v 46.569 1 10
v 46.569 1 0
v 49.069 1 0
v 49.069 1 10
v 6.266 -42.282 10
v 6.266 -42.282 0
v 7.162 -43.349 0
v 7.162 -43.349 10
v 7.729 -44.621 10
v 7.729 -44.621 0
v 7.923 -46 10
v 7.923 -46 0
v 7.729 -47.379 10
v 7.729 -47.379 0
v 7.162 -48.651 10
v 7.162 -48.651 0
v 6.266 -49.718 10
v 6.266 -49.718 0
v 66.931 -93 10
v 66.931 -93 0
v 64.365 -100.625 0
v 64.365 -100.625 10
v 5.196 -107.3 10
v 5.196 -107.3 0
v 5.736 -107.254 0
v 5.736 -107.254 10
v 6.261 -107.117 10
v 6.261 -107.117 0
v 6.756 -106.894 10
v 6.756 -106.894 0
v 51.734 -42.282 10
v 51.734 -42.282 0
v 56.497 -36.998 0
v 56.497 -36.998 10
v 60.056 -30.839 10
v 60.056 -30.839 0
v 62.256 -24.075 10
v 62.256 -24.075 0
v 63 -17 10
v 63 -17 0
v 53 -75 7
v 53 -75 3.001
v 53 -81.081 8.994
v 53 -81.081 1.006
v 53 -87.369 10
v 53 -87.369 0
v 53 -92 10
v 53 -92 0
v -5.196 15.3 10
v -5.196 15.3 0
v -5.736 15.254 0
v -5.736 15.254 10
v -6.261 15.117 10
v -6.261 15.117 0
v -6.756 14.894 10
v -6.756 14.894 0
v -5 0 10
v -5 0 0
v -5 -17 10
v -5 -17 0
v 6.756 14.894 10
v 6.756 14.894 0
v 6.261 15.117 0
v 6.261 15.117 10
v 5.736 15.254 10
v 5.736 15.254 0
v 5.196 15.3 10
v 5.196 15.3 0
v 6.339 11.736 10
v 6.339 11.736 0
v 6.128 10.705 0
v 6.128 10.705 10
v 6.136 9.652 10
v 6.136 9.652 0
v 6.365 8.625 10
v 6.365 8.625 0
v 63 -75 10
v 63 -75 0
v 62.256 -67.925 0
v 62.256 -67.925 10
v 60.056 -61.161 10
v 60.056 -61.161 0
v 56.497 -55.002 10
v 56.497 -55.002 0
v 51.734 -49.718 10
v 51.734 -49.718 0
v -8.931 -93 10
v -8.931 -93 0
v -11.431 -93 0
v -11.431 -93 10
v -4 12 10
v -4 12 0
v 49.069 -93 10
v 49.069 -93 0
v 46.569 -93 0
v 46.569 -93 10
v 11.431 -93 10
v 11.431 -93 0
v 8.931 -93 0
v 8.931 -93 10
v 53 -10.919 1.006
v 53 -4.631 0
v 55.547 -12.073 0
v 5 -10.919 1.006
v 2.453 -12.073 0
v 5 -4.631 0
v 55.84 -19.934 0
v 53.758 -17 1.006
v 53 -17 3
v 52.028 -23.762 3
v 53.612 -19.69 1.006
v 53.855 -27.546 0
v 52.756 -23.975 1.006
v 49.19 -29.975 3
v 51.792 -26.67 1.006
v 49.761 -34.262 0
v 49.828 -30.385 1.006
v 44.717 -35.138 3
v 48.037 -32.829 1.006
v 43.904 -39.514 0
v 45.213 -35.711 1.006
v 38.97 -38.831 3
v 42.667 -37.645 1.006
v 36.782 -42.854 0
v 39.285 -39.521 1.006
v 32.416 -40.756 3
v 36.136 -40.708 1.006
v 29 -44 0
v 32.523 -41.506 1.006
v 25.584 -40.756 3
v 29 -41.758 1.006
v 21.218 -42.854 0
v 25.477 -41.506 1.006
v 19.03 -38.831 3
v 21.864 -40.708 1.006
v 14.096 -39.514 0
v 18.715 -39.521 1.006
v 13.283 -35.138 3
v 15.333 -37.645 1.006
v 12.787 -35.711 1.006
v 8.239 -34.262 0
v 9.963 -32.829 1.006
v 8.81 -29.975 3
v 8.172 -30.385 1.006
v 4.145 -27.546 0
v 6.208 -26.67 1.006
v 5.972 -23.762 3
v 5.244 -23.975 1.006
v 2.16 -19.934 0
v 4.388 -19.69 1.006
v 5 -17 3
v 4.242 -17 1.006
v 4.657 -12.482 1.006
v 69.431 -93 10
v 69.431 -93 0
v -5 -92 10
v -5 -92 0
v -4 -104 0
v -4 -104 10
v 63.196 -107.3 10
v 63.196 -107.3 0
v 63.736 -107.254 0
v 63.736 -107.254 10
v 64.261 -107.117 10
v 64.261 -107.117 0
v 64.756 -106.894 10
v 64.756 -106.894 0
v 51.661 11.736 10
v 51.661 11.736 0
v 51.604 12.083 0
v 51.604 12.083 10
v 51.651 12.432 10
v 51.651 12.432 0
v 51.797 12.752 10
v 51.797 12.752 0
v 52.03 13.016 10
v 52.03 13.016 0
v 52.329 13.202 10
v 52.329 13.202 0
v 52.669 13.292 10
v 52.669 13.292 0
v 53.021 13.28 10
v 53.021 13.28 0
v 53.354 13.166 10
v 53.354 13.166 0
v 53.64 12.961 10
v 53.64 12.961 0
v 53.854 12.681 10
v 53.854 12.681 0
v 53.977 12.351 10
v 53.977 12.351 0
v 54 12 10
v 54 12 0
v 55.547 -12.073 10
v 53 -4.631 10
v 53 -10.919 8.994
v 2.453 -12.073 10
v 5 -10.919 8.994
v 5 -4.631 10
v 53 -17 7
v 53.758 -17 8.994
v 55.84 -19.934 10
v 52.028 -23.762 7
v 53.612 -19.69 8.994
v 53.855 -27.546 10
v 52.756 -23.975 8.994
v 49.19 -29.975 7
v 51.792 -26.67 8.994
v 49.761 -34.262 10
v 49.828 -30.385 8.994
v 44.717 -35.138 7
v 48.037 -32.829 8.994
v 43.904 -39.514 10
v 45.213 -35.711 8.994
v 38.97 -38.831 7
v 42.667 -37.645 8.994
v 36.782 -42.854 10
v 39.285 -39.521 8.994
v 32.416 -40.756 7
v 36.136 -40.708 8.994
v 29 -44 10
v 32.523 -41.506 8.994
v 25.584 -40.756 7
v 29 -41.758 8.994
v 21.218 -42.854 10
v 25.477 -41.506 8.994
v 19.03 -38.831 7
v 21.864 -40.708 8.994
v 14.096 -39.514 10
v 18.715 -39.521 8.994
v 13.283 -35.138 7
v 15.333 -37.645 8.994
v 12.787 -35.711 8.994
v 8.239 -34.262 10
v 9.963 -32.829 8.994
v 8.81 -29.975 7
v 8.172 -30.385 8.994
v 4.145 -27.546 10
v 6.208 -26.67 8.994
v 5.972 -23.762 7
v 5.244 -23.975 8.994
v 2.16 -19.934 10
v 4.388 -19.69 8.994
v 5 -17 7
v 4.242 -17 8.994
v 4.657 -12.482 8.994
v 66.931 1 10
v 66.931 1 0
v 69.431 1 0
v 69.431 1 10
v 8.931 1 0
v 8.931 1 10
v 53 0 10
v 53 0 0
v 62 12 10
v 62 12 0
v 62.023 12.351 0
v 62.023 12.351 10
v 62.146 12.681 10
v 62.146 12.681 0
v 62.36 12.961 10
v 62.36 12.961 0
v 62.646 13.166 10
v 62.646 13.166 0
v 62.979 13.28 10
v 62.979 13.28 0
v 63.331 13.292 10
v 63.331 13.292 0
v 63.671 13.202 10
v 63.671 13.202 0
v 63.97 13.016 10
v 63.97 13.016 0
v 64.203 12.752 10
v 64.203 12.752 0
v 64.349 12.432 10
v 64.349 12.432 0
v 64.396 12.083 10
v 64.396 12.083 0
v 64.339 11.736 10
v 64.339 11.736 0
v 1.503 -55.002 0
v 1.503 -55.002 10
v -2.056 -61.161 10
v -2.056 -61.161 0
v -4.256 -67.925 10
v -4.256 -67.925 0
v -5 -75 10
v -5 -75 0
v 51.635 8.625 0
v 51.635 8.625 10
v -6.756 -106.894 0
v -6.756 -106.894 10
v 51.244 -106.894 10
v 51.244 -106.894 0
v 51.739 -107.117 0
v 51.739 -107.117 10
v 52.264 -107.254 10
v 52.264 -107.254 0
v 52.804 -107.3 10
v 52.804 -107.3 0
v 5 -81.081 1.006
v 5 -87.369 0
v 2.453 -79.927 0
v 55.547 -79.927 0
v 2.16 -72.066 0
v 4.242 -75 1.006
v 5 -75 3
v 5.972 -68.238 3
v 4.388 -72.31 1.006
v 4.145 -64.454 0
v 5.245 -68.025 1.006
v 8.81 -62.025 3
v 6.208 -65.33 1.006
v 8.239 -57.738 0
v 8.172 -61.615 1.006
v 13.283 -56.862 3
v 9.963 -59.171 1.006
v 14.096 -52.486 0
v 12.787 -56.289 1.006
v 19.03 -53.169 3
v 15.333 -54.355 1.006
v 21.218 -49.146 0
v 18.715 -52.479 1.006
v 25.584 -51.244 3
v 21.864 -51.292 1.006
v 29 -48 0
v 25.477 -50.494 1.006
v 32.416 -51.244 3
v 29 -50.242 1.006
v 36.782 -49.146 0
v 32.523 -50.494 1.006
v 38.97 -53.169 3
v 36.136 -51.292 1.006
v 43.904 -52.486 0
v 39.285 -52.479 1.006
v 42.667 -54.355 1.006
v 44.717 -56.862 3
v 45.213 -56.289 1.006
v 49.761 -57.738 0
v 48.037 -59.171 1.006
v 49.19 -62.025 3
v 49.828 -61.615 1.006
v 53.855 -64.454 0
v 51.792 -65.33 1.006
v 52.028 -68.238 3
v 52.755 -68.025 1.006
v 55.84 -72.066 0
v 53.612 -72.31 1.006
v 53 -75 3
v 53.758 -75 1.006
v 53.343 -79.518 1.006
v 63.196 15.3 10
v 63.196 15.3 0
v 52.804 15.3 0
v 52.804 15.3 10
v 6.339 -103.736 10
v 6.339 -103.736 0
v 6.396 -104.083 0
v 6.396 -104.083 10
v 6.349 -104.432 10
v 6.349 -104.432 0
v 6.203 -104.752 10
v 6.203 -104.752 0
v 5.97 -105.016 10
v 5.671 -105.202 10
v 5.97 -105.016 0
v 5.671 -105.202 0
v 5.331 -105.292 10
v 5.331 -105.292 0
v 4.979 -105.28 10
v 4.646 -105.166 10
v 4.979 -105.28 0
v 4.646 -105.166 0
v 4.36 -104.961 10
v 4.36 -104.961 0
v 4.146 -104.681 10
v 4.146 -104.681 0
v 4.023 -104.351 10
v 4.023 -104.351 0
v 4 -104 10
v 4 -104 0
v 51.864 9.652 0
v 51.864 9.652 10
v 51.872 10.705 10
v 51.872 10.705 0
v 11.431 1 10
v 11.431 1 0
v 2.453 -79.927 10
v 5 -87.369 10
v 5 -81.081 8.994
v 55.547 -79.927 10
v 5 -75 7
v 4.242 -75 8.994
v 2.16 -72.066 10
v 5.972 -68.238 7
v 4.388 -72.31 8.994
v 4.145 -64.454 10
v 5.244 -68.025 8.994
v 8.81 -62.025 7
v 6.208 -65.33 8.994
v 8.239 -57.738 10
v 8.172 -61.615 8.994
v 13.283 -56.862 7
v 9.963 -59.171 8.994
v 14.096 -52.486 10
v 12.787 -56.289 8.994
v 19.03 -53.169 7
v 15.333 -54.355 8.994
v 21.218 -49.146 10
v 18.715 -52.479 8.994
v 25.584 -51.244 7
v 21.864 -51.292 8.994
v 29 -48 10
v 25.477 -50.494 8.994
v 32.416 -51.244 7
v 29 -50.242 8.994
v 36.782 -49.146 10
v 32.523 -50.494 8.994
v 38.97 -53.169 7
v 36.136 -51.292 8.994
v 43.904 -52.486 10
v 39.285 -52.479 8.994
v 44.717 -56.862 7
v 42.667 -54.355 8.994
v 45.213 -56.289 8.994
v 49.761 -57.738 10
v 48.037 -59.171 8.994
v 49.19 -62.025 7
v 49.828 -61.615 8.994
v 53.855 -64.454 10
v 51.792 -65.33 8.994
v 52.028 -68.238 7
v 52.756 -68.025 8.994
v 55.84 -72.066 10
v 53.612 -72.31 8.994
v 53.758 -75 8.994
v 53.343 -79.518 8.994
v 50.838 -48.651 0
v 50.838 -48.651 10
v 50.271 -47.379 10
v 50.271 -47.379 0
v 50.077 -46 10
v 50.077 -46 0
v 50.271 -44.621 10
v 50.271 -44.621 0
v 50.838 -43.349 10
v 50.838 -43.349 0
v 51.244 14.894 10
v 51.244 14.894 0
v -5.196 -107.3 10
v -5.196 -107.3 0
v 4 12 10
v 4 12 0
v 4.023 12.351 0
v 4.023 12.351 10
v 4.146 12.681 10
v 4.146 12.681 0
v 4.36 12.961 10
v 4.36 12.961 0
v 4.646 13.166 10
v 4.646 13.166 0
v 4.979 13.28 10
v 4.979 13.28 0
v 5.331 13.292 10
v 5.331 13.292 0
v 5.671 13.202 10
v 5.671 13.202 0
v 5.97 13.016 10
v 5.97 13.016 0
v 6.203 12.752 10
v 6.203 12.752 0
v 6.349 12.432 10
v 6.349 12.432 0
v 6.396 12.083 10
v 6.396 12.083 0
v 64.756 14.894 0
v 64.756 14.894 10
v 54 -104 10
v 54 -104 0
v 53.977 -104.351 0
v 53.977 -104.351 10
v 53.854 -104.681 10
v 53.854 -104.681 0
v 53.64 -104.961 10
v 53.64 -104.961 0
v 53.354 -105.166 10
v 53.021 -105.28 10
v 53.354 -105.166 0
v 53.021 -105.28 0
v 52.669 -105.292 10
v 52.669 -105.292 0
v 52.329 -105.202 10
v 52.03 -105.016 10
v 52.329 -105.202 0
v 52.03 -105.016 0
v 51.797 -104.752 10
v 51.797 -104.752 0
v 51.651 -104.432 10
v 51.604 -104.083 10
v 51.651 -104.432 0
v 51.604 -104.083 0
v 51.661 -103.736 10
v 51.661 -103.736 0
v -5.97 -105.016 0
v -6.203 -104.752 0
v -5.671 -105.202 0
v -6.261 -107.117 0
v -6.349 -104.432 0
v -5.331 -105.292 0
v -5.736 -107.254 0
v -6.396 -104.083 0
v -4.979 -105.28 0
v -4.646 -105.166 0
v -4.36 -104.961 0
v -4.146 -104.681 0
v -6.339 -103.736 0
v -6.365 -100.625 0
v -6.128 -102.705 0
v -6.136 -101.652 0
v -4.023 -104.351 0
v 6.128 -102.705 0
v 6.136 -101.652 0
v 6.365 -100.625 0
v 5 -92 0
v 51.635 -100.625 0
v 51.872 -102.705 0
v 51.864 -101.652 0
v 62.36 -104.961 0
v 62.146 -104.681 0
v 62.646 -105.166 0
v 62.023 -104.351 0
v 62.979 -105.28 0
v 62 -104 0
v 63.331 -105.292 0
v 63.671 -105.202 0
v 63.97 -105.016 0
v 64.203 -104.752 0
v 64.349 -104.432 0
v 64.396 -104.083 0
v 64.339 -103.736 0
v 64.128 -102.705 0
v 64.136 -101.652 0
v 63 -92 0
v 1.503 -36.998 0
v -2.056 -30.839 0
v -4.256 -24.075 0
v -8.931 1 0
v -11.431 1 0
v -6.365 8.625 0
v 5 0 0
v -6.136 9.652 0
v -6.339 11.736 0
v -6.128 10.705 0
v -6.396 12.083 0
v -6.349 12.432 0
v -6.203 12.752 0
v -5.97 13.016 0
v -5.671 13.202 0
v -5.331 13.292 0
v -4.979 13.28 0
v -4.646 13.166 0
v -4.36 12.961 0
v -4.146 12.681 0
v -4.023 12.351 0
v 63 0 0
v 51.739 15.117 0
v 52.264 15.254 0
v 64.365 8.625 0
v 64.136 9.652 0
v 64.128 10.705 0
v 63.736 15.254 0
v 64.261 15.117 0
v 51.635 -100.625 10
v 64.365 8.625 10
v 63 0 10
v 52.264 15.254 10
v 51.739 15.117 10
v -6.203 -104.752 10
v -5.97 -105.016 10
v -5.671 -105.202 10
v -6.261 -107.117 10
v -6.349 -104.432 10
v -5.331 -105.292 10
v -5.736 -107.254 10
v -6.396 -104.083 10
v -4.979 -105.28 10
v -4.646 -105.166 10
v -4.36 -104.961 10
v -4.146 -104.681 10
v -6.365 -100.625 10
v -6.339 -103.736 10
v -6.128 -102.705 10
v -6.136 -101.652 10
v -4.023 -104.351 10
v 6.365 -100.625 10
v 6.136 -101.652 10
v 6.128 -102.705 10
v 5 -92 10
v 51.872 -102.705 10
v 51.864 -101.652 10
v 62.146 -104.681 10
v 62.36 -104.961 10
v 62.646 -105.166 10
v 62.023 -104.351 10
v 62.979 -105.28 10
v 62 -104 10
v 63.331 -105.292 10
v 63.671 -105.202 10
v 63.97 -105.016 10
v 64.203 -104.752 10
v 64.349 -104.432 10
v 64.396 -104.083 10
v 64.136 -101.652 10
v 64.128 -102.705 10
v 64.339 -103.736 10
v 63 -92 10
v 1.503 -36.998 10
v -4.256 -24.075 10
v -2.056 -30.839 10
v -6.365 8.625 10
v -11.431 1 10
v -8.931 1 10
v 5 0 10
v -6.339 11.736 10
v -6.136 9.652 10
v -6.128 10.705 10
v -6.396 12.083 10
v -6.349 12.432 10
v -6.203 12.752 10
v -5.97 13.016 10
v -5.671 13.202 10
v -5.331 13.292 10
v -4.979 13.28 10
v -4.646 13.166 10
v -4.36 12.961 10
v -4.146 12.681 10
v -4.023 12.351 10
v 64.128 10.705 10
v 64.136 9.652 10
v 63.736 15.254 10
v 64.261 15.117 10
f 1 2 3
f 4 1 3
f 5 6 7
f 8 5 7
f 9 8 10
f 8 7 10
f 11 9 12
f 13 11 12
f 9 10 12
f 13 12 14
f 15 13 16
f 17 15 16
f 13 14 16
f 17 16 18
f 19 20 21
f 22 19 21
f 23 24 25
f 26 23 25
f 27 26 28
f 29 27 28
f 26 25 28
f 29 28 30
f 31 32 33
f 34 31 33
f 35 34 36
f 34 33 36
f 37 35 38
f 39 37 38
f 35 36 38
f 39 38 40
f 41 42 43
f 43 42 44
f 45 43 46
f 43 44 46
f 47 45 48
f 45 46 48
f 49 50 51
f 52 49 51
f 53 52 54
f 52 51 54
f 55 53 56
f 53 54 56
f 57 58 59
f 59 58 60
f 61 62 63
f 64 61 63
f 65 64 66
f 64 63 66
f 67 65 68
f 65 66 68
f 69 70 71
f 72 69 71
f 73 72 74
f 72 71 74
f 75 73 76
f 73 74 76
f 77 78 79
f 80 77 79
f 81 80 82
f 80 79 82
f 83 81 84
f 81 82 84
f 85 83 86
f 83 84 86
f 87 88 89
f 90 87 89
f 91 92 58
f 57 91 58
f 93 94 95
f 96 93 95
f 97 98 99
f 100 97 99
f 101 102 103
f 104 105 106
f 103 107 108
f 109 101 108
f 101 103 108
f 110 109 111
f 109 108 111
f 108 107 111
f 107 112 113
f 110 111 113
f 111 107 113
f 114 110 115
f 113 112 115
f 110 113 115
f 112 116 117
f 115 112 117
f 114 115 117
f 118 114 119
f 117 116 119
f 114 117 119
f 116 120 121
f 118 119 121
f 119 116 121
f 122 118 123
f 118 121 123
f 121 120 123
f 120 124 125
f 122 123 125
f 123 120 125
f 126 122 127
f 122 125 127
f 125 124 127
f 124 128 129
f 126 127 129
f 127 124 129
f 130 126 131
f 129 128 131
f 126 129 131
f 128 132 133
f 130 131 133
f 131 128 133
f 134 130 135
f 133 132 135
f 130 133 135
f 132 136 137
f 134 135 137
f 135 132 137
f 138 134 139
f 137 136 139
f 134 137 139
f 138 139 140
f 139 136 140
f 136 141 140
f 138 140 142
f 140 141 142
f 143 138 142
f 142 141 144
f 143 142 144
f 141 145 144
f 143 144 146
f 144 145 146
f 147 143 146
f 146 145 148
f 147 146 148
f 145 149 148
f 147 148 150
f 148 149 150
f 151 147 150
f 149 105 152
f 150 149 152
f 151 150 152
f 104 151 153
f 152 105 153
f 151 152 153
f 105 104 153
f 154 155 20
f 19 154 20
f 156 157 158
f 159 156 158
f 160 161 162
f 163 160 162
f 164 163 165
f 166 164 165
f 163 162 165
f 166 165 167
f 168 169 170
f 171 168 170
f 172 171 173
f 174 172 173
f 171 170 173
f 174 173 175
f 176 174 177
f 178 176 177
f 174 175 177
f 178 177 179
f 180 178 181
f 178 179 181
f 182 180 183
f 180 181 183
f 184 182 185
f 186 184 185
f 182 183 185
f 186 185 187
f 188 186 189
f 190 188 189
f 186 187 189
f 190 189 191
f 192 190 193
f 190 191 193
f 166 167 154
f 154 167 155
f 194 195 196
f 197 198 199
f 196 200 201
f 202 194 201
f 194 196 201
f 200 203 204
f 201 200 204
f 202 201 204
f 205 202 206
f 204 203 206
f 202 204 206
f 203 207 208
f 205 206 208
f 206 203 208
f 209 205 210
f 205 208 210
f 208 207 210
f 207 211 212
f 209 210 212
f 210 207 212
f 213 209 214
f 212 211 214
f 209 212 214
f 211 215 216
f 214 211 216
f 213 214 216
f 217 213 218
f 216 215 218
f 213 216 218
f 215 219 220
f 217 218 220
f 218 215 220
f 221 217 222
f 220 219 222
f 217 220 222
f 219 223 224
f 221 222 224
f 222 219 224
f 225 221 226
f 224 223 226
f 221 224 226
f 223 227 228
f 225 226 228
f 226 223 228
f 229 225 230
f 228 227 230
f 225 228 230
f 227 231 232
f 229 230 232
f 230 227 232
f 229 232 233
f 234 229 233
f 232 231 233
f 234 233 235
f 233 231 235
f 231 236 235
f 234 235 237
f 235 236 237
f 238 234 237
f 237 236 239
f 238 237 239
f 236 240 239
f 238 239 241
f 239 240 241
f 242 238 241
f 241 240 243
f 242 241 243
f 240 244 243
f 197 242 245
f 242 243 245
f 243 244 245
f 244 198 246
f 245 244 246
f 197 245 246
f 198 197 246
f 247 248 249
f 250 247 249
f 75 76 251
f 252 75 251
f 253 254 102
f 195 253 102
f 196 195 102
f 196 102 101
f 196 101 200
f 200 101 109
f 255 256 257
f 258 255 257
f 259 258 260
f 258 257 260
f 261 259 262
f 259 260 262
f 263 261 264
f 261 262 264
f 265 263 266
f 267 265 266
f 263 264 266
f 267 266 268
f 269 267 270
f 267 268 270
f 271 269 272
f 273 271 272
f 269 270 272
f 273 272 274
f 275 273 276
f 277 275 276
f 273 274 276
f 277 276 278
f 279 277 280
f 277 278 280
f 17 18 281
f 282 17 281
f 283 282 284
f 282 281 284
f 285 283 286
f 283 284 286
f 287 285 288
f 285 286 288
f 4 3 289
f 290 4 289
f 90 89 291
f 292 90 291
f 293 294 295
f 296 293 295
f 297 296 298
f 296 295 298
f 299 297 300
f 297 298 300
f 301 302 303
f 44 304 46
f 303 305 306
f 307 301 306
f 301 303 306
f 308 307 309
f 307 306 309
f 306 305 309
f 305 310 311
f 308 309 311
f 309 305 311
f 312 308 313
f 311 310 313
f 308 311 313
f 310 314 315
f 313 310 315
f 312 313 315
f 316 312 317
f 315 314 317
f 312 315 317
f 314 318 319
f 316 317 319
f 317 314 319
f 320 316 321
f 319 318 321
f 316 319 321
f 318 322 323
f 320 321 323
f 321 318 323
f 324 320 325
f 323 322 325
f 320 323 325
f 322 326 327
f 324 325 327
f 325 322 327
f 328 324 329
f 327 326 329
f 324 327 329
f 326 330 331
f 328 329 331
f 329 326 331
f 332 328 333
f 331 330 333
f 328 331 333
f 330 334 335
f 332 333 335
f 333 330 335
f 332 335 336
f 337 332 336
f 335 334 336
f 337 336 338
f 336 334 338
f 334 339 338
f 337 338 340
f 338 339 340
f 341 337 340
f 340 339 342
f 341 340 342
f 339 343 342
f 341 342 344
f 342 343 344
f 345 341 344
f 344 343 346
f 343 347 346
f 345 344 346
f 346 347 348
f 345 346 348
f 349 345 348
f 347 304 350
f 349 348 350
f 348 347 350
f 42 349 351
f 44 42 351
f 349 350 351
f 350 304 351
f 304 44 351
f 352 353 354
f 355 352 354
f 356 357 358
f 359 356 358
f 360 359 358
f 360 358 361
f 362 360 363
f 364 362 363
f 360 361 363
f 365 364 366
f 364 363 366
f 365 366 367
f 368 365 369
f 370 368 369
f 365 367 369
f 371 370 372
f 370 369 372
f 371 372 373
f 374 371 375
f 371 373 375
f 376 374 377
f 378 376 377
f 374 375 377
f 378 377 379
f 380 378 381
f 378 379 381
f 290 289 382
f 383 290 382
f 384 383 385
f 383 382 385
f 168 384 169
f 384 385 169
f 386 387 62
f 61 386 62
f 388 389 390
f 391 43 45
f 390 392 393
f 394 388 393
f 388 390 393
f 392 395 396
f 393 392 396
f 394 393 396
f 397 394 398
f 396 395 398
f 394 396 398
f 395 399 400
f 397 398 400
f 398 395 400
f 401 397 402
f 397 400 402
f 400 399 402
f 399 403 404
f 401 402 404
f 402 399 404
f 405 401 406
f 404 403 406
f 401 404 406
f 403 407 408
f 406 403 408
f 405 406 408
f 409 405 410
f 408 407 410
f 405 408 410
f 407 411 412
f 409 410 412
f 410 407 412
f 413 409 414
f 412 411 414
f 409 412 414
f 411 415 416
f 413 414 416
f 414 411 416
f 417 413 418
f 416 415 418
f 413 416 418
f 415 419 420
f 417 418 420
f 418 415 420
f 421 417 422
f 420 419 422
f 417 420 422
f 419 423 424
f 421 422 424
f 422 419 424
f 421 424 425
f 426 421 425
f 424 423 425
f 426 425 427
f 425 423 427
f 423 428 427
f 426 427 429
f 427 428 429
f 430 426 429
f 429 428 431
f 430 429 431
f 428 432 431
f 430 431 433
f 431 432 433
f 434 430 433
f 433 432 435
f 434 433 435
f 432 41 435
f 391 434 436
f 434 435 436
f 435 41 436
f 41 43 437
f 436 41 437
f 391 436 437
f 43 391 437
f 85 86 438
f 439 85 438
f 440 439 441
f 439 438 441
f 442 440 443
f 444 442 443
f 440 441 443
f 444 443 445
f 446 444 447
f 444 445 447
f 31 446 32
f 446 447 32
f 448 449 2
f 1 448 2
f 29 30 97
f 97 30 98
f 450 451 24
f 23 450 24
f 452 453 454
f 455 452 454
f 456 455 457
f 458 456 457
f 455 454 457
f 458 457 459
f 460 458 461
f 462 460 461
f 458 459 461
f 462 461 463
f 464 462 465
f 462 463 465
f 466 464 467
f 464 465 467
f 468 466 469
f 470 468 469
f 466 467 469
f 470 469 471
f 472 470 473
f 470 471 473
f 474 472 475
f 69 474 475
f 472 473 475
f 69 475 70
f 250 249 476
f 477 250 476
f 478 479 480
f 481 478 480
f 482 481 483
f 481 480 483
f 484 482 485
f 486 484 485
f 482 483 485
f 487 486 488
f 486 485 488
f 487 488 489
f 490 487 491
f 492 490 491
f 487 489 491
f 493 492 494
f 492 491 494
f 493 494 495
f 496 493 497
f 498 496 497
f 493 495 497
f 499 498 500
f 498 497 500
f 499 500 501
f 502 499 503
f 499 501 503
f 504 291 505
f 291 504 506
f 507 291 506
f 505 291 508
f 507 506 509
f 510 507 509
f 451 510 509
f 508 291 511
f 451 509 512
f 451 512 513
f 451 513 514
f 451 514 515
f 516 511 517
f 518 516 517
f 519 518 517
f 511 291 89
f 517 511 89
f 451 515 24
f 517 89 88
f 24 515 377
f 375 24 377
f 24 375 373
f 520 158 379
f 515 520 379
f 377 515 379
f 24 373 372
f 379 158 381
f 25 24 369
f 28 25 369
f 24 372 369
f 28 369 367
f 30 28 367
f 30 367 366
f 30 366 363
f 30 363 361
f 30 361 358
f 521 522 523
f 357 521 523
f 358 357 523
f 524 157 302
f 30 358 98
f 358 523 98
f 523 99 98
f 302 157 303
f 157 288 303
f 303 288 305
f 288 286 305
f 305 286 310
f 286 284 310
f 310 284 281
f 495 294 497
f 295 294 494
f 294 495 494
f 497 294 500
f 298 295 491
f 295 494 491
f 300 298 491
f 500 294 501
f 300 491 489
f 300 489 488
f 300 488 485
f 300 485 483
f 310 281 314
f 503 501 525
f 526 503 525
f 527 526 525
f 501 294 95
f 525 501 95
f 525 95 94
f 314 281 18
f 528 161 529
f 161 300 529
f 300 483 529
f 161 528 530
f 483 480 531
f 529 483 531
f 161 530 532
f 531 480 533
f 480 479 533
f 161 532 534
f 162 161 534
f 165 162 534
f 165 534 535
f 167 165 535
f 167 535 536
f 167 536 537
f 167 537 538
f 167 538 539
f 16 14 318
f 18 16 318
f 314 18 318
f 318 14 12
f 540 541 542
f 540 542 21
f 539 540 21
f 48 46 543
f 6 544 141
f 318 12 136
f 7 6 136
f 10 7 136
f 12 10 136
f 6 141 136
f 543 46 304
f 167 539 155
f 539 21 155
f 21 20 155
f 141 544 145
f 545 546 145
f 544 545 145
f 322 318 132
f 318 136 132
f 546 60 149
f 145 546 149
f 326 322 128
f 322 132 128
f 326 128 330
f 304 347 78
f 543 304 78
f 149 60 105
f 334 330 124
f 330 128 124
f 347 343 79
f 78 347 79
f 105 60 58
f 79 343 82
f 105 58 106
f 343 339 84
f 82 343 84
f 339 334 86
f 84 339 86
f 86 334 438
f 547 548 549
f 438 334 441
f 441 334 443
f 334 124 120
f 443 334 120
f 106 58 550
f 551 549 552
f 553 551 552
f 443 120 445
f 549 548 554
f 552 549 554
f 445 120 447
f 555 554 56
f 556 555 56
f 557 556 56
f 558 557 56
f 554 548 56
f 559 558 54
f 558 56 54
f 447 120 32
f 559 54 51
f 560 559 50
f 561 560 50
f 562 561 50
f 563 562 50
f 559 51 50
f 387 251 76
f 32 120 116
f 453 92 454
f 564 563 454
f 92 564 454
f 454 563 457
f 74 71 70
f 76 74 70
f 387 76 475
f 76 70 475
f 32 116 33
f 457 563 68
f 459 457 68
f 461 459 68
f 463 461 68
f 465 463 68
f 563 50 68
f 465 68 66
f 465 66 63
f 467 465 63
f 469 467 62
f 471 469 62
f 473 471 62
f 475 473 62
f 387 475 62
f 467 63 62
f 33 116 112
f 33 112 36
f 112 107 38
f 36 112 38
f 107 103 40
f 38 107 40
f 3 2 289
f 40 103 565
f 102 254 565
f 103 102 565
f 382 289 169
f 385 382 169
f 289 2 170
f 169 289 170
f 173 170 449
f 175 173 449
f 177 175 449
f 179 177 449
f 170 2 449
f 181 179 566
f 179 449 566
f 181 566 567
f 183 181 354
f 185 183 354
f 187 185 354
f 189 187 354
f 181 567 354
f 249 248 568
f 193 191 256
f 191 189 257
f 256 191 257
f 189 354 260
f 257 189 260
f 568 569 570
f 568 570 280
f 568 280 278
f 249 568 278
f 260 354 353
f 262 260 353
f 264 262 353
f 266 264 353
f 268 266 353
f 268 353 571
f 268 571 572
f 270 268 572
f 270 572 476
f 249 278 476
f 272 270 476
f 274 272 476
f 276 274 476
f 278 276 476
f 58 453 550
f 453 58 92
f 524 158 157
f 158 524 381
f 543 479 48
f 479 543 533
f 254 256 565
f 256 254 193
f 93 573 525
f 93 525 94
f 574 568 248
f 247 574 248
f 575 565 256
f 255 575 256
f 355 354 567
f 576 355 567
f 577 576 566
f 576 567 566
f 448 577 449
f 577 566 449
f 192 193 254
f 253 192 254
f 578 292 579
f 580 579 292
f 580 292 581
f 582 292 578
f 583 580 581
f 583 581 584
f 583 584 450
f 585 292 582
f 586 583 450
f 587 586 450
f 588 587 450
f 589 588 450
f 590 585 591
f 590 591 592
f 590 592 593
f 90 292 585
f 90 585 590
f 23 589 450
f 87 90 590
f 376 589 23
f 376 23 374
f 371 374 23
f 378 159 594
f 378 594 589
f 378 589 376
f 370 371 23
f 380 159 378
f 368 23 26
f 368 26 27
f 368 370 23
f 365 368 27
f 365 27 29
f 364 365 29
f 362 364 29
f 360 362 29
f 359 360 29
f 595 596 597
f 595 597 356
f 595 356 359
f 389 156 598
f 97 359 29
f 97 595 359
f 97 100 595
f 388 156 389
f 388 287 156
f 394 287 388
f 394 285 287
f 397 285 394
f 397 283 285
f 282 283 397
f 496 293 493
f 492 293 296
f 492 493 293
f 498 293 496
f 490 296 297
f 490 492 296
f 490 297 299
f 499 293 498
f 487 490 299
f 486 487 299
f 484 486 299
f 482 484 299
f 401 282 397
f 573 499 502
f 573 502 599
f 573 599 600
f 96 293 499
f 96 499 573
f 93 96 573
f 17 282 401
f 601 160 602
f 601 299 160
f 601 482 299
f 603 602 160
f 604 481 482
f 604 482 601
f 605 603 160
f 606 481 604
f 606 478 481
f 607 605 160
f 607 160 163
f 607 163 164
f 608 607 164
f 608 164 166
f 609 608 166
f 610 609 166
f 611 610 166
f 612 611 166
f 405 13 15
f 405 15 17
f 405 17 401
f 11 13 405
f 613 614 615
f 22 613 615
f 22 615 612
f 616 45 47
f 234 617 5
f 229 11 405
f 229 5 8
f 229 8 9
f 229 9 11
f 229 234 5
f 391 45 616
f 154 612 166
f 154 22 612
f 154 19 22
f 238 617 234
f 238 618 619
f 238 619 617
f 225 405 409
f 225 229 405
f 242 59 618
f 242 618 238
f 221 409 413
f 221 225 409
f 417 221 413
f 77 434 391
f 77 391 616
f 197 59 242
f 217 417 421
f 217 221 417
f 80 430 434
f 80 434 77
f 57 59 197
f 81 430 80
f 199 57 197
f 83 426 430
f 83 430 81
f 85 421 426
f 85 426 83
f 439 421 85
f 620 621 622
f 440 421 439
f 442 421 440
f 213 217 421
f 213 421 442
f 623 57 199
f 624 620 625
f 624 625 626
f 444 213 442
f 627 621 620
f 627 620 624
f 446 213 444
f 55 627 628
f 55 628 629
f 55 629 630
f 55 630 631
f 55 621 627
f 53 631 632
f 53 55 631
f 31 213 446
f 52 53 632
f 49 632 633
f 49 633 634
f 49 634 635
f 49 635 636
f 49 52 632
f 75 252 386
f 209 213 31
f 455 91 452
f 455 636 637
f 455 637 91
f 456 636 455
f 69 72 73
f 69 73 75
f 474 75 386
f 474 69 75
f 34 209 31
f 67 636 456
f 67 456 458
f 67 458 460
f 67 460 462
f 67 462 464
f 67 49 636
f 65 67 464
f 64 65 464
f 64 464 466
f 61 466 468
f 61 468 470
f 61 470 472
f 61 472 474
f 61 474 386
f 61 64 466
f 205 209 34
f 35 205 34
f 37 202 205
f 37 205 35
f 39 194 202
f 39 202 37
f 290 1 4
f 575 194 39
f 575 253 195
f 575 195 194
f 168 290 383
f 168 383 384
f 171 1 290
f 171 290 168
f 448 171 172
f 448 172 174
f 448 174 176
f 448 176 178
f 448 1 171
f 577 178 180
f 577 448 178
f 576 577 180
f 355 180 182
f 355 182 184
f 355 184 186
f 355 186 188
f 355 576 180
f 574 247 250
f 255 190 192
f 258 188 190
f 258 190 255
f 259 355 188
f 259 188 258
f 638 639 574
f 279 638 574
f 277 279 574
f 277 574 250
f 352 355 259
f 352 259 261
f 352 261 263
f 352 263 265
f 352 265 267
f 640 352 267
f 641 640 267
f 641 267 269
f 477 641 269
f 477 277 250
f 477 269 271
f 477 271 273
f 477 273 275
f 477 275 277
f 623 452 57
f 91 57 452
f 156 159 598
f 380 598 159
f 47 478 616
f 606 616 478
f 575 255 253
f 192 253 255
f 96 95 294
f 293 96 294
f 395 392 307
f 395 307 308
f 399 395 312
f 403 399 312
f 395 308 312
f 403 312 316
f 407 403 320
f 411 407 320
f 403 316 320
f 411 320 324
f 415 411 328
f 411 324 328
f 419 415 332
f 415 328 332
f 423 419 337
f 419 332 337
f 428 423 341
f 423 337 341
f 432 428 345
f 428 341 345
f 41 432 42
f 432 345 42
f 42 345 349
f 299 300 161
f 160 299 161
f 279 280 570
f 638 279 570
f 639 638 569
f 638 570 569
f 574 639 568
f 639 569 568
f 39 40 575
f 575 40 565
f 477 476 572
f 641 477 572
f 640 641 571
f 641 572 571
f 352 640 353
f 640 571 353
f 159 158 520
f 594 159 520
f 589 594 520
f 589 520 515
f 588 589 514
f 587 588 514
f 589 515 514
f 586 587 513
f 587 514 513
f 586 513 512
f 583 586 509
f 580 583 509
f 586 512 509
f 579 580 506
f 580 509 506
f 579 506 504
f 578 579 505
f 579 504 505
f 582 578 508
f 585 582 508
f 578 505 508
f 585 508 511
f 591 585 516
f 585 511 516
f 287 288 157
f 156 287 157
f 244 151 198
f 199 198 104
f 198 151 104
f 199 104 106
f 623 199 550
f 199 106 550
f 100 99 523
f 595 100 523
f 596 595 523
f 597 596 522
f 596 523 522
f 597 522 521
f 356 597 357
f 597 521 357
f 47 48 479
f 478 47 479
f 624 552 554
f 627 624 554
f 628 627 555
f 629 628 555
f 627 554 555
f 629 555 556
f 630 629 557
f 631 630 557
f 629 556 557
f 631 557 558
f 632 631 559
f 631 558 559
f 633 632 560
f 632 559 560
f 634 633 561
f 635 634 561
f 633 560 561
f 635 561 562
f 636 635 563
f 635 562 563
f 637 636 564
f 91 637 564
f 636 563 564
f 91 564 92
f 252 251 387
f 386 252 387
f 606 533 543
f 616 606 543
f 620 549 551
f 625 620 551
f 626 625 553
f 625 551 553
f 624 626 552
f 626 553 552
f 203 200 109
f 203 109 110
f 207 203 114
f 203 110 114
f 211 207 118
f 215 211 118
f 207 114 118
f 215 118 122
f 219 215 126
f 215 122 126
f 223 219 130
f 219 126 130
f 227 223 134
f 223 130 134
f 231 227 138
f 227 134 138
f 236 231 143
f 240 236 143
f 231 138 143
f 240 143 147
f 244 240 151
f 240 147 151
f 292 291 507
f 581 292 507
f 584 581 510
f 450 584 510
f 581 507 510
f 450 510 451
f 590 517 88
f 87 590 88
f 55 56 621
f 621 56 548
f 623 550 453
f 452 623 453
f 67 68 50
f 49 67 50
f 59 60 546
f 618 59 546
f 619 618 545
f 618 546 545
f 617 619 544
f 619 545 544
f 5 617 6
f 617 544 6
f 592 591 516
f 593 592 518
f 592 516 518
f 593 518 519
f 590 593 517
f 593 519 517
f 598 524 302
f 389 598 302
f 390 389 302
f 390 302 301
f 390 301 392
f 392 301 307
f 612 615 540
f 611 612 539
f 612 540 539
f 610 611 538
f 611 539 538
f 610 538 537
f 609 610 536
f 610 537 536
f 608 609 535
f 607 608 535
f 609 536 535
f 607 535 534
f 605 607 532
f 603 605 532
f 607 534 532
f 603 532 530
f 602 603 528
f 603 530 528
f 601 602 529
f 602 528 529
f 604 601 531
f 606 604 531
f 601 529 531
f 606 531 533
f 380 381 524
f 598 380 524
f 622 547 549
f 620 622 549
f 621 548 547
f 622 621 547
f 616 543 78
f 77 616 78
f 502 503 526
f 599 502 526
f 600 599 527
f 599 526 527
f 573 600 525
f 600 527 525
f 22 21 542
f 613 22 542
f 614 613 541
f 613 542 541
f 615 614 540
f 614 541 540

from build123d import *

# Parameters (mm, degrees)
F1_DEPTH    = 10
F2_T2_ANGLE = 240.9746670828
F2_T4_ANGLE = 240.9746670828
F2_T6_ANGLE = 240.9746670828
F2_T8_ANGLE = 240.9746670828


# Not quite as in the source:
# - a fillet or chamfer that OpenCascade refuses, or shapes differently, is made with other operations: its cross-section is extruded or revolved along the edge and cut away or added


with BuildPart() as f1:
    # F0 (on Top) → F1 (new body)
    with BuildSketch(Plane.XY):
        with BuildLine():
            ThreePointArc((6.3393482774, 11.7357549763), (6.1040734685, 10.1783374237), (6.3649625736, 8.6250053459))
            Line((6.3649625736, 8.6250053459), (8.9305315263, 1))
            Line((8.9305315263, 1), (11.4305315263, 1))
            Line((11.4305315263, 1), (6.7557454084, 14.8937092698))
            ThreePointArc((6.7557454084, 14.8937092698), (6.001778287, 15.1965058009), (5.1958549099, 15.2996545758))
            Line((5.1958549099, 15.2996545758), (0, 15.2996545758))
            Line((0, 15.2996545758), (-5.1958549099, 15.2996545758))
            ThreePointArc((-5.1958549099, 15.2996545758), (-6.001778287, 15.1965058009), (-6.7557454084, 14.8937092698))
            Line((-6.7557454084, 14.8937092698), (-11.4305315263, 1))
            Line((-11.4305315263, 1), (-8.9305315263, 1))
            Line((-8.9305315263, 1), (-6.3649625736, 8.6250053459))
            ThreePointArc((-6.3649625736, 8.6250053459), (-6.1040734685, 10.1783374237), (-6.3393482774, 11.7357549763))
            ThreePointArc((-6.3393482774, 11.7357549763), (-5.3305463755, 13.2920715369), (-4, 12))
            Line((-4, 12), (-5, 0))
            Line((-5, 0), (-5, -17))
            ThreePointArc((-5, -17), (-2.0559445405, -30.8393753001), (6.2663710998, -42.2820512821))
            ThreePointArc((6.2663710998, -42.2820512821), (7.9231903792, -46), (6.2663710998, -49.7179487179))
            ThreePointArc((6.2663710998, -49.7179487179), (-2.0559445405, -61.1606246999), (-5, -75))
            Line((-5, -75), (-5, -92))
            Line((-5, -92), (-4, -104))
            ThreePointArc((-4, -104), (-5.3305463755, -105.2920715369), (-6.3393482774, -103.7357549763))
            ThreePointArc((-6.3393482774, -103.7357549763), (-6.1040734685, -102.1783374237), (-6.3649625736, -100.6250053459))
            Line((-6.3649625736, -100.6250053459), (-8.9305315263, -93))
            Line((-8.9305315263, -93), (-11.4305315263, -93))
            Line((-11.4305315263, -93), (-6.7557454084, -106.8937092698))
            ThreePointArc((-6.7557454084, -106.8937092698), (-6.001778287, -107.1965058009), (-5.1958549099, -107.2996545758))
            Line((-5.1958549099, -107.2996545758), (0, -107.2996545758))
            Line((0, -107.2996545758), (5.1958549099, -107.2996545758))
            ThreePointArc((5.1958549099, -107.2996545758), (6.001778287, -107.1965058009), (6.7557454084, -106.8937092698))
            Line((6.7557454084, -106.8937092698), (11.4305315263, -93))
            Line((11.4305315263, -93), (8.9305315263, -93))
            Line((8.9305315263, -93), (6.3649625736, -100.6250053459))
            ThreePointArc((6.3649625736, -100.6250053459), (6.1040734685, -102.1783374237), (6.3393482774, -103.7357549763))
            ThreePointArc((6.3393482774, -103.7357549763), (5.3305463755, -105.2920715369), (4, -104))
            Line((4, -104), (5, -92))
            Line((5, -92), (5, -75))
            ThreePointArc((5, -75), (29, -51), (53, -75))
            Line((53, -75), (53, -92))
            Line((53, -92), (54, -104))
            ThreePointArc((54, -104), (52.6694536245, -105.2920715369), (51.6606517226, -103.7357549763))
            ThreePointArc((51.6606517226, -103.7357549763), (51.8959265315, -102.1783374237), (51.6350374264, -100.6250053459))
            Line((51.6350374264, -100.6250053459), (49.0694684737, -93))
            Line((49.0694684737, -93), (46.5694684737, -93))
            Line((46.5694684737, -93), (51.2442545916, -106.8937092698))
            ThreePointArc((51.2442545916, -106.8937092698), (51.998221713, -107.1965058009), (52.8041450901, -107.2996545758))
            Line((52.8041450901, -107.2996545758), (58, -107.2996545758))
            Line((58, -107.2996545758), (63.1958549099, -107.2996545758))
            ThreePointArc((63.1958549099, -107.2996545758), (64.001778287, -107.1965058009), (64.7557454084, -106.8937092698))
            Line((64.7557454084, -106.8937092698), (69.4305315263, -93))
            Line((69.4305315263, -93), (66.9305315263, -93))
            Line((66.9305315263, -93), (64.3649625736, -100.6250053459))
            ThreePointArc((64.3649625736, -100.6250053459), (64.1040734685, -102.1783374237), (64.3393482774, -103.7357549763))
            ThreePointArc((64.3393482774, -103.7357549763), (63.3305463755, -105.2920715369), (62, -104))
            Line((62, -104), (63, -92))
            Line((63, -92), (63, -75))
            ThreePointArc((63, -75), (60.0559445405, -61.1606246999), (51.7336289002, -49.7179487179))
            ThreePointArc((51.7336289002, -49.7179487179), (50.0768096208, -46), (51.7336289002, -42.2820512821))
            ThreePointArc((51.7336289002, -42.2820512821), (60.0559445405, -30.8393753001), (63, -17))
            Line((63, -17), (63, 0))
            Line((63, 0), (62, 12))
            ThreePointArc((62, 12), (63.3305463755, 13.2920715369), (64.3393482774, 11.7357549763))
            ThreePointArc((64.3393482774, 11.7357549763), (64.1040734685, 10.1783374237), (64.3649625736, 8.6250053459))
            Line((64.3649625736, 8.6250053459), (66.9305315263, 1))
            Line((66.9305315263, 1), (69.4305315263, 1))
            Line((69.4305315263, 1), (64.7557454084, 14.8937092698))
            ThreePointArc((64.7557454084, 14.8937092698), (64.001778287, 15.1965058009), (63.1958549099, 15.2996545758))
            Line((63.1958549099, 15.2996545758), (58, 15.2996545758))
            Line((58, 15.2996545758), (52.8041450901, 15.2996545758))
            ThreePointArc((52.8041450901, 15.2996545758), (51.998221713, 15.1965058009), (51.2442545916, 14.8937092698))
            Line((51.2442545916, 14.8937092698), (46.5694684737, 1))
            Line((46.5694684737, 1), (49.0694684737, 1))
            Line((49.0694684737, 1), (51.6350374264, 8.6250053459))
            ThreePointArc((51.6350374264, 8.6250053459), (51.8959265315, 10.1783374237), (51.6606517226, 11.7357549763))
            ThreePointArc((51.6606517226, 11.7357549763), (52.6694536245, 13.2920715369), (54, 12))
            Line((54, 12), (53, 0))
            Line((53, 0), (53, -17))
            ThreePointArc((53, -17), (29, -41), (5, -17))
            Line((5, -17), (5, 0))
            Line((5, 0), (4, 12))
            ThreePointArc((4, 12), (5.3305463755, 13.2920715369), (6.3393482774, 11.7357549763))
        make_face()
    extrude(amount=F1_DEPTH)

    # F2: fillet of radius 3 on 4 edges, made by hand

    # F2_s1 → F2_t2 (revolve, cut)
    with BuildSketch(Plane(origin=(14.8970987107, -25.3030447424, 0), x_dir=(0, 0, 1), z_dir=(-0.507347869, 0.8617413416, 0))):
        with BuildLine():
            ThreePointArc((10, 43.3655851338), (9.1213203436, 41.2442647902), (7, 40.3655851338))
            Line((7, 40.3655851338), (10, 40.3655851338))
            Line((10, 40.3655851338), (10, 43.3655851338))
        make_face()
    revolve(axis=Axis((29, -17, 10), (0, 0, -1)), revolution_arc=F2_T2_ANGLE, mode=Mode.SUBTRACT)

    # F2_s3 → F2_t4 (revolve, cut)
    with BuildSketch(Plane(origin=(14.8970987107, -25.3030447424, 0), x_dir=(0, 0, 1), z_dir=(-0.507347869, 0.8617413416, 0))):
        with BuildLine():
            ThreePointArc((3, 40.3655851338), (0.8786796564, 41.2442647902), (0, 43.3655851338))
            Line((0, 43.3655851338), (0, 40.3655851338))
            Line((0, 40.3655851338), (3, 40.3655851338))
        make_face()
    revolve(axis=Axis((29, -17, 0), (0, 0, -1)), revolution_arc=F2_T4_ANGLE, mode=Mode.SUBTRACT)

    # F2_s5 → F2_t6 (revolve, cut)
    with BuildSketch(Plane(origin=(40.2548514411, -68.3737368527, 0), x_dir=(0, 0, 1), z_dir=(0.507347869, -0.8617413416, 0))):
        with BuildLine():
            ThreePointArc((10, 40.0605912676), (9.1213203436, 37.939270924), (7, 37.0605912676))
            Line((7, 37.0605912676), (10, 37.0605912676))
            Line((10, 37.0605912676), (10, 40.0605912676))
        make_face()
    revolve(axis=Axis((29, -75, 10), (0, 0, -1)), revolution_arc=F2_T6_ANGLE, mode=Mode.SUBTRACT)

    # F2_s7 → F2_t8 (revolve, cut)
    with BuildSketch(Plane(origin=(40.2548514411, -68.3737368527, 0), x_dir=(0, 0, 1), z_dir=(0.507347869, -0.8617413416, 0))):
        with BuildLine():
            ThreePointArc((3, 37.0605912676), (0.8786796564, 37.939270924), (0, 40.0605912676))
            Line((0, 40.0605912676), (0, 37.0605912676))
            Line((0, 37.0605912676), (3, 37.0605912676))
        make_face()
    revolve(axis=Axis((29, -75, 0), (0, 0, -1)), revolution_arc=F2_T8_ANGLE, mode=Mode.SUBTRACT)


solid = f1.part
